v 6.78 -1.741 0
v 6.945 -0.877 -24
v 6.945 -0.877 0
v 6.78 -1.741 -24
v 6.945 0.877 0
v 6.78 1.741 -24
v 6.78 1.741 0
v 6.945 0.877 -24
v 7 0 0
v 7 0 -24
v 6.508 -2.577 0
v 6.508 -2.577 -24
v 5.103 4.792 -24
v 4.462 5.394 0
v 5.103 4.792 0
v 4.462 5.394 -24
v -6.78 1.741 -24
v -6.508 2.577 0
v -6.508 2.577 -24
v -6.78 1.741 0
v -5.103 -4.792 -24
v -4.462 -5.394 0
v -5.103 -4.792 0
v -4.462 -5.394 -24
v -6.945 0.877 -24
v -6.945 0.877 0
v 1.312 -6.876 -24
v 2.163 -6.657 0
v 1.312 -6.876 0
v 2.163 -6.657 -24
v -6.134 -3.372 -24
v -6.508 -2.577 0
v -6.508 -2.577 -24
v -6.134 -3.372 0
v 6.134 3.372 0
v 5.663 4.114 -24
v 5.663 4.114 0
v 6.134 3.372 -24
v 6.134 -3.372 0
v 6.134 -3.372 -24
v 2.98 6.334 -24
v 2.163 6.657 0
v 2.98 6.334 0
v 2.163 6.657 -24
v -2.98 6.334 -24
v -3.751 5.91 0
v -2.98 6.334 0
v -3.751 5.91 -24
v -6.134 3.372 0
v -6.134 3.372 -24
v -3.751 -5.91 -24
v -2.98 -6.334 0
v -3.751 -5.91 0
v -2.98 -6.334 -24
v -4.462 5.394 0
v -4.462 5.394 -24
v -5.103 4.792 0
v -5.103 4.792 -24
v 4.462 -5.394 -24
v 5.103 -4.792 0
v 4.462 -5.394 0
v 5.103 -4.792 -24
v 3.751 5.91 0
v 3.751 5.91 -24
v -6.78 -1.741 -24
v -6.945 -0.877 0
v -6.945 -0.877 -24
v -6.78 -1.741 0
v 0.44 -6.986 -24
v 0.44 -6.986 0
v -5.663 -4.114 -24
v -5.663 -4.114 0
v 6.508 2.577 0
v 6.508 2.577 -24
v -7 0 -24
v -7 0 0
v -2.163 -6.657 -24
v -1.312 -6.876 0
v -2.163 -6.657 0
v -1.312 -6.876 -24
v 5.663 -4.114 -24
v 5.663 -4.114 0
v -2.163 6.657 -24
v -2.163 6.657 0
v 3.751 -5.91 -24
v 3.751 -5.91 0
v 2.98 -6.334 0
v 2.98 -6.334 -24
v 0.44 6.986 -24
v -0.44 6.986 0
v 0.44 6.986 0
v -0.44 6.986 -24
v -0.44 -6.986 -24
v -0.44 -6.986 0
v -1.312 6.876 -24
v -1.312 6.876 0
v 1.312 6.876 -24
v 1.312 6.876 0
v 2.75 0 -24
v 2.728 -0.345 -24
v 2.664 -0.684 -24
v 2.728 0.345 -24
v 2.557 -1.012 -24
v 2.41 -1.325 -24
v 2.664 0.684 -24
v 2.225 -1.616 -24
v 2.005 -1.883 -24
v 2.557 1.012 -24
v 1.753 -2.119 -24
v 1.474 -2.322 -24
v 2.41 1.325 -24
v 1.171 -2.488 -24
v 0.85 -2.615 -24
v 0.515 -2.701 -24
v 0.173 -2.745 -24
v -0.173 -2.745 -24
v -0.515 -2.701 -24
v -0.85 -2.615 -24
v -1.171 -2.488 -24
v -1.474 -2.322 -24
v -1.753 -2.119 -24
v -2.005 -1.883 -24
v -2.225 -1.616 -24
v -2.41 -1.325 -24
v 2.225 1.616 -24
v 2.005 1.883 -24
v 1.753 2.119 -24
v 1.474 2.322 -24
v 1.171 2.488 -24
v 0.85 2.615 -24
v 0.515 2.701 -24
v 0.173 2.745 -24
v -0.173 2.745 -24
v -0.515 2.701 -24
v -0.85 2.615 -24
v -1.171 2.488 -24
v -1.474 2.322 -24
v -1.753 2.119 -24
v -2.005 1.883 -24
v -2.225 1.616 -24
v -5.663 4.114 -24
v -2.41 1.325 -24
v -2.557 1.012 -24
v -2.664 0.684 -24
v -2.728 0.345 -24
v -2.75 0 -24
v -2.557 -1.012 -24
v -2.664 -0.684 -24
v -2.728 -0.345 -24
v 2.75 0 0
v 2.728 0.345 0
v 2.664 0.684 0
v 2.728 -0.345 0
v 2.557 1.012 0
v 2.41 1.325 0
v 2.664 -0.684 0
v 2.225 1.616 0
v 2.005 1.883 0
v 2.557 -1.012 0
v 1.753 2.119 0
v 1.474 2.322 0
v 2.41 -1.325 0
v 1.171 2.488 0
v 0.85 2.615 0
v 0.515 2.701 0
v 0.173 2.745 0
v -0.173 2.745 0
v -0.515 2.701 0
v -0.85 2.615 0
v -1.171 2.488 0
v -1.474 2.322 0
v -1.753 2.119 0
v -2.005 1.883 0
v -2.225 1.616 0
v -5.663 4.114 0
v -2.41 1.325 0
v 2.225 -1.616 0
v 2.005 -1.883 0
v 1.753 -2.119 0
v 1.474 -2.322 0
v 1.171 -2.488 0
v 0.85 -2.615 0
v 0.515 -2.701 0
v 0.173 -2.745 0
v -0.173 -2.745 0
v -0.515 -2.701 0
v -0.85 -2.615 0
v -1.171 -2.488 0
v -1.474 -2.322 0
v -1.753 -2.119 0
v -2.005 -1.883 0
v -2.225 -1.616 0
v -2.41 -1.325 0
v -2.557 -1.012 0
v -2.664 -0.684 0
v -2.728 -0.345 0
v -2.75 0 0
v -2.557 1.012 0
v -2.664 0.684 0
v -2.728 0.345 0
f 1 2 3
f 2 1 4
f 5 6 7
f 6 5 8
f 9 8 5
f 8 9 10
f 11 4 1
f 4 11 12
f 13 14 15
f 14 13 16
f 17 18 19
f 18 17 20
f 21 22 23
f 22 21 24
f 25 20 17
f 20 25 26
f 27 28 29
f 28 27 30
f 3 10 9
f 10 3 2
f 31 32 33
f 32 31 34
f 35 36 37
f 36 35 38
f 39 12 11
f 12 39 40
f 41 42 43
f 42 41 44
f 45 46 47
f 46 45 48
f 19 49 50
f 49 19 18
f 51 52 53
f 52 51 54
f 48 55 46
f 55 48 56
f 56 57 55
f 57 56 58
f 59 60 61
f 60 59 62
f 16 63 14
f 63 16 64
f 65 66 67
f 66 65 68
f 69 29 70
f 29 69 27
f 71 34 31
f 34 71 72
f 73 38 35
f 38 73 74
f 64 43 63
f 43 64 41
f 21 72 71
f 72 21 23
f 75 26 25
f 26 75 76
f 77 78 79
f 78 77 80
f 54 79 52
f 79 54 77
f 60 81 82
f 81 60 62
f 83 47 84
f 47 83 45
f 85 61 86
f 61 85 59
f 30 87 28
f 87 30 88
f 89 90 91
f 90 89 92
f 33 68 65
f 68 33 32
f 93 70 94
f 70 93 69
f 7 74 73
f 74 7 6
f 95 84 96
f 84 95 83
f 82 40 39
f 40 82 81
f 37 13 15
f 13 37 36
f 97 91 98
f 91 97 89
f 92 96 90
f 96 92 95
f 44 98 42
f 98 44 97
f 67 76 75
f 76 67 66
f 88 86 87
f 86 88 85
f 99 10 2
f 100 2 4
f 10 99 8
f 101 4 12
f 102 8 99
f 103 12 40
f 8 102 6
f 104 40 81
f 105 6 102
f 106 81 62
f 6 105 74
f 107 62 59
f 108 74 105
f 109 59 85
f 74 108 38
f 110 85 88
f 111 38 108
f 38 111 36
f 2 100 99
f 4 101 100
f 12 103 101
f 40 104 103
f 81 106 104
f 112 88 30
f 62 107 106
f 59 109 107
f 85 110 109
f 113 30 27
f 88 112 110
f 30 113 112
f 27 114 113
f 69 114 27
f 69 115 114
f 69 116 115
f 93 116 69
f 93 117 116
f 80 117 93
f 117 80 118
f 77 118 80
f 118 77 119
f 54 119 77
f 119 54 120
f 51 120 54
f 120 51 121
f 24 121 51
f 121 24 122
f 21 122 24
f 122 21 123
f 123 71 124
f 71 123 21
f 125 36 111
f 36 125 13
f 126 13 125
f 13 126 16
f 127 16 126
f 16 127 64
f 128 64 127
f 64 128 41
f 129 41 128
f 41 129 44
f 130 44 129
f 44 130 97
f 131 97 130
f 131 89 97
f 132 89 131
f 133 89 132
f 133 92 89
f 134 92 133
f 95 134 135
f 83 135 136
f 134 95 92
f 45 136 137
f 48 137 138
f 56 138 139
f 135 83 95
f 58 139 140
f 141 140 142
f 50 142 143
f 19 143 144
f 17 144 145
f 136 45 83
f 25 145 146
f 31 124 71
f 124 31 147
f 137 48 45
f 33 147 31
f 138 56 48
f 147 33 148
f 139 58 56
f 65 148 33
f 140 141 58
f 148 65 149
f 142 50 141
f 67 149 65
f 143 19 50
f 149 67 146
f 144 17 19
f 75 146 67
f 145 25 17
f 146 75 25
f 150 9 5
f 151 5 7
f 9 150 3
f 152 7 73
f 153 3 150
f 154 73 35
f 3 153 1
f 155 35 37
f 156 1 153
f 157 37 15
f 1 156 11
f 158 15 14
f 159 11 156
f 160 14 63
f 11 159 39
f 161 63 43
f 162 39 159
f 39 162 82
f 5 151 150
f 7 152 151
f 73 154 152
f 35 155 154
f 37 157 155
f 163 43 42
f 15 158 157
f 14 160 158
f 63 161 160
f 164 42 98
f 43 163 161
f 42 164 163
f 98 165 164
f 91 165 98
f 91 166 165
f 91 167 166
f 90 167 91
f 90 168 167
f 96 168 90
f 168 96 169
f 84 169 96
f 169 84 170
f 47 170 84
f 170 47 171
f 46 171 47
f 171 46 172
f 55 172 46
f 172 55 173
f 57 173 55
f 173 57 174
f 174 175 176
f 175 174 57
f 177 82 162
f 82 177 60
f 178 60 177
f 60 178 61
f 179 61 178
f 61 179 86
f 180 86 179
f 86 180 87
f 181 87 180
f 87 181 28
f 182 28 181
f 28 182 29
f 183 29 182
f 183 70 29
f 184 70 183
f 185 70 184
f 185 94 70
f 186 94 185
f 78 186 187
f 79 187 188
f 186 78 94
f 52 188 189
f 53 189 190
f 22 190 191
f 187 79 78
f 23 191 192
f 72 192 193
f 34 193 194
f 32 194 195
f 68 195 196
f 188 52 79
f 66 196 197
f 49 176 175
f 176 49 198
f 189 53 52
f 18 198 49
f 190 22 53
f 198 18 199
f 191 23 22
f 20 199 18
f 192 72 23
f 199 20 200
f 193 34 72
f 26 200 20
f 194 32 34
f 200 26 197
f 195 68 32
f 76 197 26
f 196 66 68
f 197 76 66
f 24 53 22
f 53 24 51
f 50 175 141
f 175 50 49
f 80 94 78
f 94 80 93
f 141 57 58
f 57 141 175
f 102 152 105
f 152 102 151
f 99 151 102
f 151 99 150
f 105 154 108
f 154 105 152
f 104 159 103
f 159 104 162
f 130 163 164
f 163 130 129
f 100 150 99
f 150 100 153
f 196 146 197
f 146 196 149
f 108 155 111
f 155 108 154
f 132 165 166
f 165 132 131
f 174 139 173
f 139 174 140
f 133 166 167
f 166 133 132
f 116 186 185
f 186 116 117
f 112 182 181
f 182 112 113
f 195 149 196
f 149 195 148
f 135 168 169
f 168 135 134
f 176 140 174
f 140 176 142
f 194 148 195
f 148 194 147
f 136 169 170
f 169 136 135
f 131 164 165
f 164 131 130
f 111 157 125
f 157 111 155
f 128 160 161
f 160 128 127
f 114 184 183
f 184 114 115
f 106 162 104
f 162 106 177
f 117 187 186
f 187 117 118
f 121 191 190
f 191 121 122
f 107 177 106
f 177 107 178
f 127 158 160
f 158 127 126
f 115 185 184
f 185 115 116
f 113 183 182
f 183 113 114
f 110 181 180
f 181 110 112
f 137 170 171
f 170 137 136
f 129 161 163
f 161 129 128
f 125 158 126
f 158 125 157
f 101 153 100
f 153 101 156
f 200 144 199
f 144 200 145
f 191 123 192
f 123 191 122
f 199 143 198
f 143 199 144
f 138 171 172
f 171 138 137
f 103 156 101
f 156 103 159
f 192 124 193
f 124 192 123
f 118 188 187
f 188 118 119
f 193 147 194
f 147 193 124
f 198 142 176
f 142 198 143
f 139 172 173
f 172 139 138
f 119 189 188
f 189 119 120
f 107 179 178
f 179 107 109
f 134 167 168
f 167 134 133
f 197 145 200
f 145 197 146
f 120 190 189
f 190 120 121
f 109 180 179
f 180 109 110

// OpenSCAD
$fn = 50;


difference() {
	union() {
		translate(v = [0, 0, -24.0000000000]) {
			cylinder(h = 24, r = 7.0000000000);
		}
		cylinder(h = 0, r = 17.0000000000);
	}
	union() {
		#translate(v = [0, 0, -24]) {
			cylinder(h = 24, r = 2.7500000000);
		}
	}
}
